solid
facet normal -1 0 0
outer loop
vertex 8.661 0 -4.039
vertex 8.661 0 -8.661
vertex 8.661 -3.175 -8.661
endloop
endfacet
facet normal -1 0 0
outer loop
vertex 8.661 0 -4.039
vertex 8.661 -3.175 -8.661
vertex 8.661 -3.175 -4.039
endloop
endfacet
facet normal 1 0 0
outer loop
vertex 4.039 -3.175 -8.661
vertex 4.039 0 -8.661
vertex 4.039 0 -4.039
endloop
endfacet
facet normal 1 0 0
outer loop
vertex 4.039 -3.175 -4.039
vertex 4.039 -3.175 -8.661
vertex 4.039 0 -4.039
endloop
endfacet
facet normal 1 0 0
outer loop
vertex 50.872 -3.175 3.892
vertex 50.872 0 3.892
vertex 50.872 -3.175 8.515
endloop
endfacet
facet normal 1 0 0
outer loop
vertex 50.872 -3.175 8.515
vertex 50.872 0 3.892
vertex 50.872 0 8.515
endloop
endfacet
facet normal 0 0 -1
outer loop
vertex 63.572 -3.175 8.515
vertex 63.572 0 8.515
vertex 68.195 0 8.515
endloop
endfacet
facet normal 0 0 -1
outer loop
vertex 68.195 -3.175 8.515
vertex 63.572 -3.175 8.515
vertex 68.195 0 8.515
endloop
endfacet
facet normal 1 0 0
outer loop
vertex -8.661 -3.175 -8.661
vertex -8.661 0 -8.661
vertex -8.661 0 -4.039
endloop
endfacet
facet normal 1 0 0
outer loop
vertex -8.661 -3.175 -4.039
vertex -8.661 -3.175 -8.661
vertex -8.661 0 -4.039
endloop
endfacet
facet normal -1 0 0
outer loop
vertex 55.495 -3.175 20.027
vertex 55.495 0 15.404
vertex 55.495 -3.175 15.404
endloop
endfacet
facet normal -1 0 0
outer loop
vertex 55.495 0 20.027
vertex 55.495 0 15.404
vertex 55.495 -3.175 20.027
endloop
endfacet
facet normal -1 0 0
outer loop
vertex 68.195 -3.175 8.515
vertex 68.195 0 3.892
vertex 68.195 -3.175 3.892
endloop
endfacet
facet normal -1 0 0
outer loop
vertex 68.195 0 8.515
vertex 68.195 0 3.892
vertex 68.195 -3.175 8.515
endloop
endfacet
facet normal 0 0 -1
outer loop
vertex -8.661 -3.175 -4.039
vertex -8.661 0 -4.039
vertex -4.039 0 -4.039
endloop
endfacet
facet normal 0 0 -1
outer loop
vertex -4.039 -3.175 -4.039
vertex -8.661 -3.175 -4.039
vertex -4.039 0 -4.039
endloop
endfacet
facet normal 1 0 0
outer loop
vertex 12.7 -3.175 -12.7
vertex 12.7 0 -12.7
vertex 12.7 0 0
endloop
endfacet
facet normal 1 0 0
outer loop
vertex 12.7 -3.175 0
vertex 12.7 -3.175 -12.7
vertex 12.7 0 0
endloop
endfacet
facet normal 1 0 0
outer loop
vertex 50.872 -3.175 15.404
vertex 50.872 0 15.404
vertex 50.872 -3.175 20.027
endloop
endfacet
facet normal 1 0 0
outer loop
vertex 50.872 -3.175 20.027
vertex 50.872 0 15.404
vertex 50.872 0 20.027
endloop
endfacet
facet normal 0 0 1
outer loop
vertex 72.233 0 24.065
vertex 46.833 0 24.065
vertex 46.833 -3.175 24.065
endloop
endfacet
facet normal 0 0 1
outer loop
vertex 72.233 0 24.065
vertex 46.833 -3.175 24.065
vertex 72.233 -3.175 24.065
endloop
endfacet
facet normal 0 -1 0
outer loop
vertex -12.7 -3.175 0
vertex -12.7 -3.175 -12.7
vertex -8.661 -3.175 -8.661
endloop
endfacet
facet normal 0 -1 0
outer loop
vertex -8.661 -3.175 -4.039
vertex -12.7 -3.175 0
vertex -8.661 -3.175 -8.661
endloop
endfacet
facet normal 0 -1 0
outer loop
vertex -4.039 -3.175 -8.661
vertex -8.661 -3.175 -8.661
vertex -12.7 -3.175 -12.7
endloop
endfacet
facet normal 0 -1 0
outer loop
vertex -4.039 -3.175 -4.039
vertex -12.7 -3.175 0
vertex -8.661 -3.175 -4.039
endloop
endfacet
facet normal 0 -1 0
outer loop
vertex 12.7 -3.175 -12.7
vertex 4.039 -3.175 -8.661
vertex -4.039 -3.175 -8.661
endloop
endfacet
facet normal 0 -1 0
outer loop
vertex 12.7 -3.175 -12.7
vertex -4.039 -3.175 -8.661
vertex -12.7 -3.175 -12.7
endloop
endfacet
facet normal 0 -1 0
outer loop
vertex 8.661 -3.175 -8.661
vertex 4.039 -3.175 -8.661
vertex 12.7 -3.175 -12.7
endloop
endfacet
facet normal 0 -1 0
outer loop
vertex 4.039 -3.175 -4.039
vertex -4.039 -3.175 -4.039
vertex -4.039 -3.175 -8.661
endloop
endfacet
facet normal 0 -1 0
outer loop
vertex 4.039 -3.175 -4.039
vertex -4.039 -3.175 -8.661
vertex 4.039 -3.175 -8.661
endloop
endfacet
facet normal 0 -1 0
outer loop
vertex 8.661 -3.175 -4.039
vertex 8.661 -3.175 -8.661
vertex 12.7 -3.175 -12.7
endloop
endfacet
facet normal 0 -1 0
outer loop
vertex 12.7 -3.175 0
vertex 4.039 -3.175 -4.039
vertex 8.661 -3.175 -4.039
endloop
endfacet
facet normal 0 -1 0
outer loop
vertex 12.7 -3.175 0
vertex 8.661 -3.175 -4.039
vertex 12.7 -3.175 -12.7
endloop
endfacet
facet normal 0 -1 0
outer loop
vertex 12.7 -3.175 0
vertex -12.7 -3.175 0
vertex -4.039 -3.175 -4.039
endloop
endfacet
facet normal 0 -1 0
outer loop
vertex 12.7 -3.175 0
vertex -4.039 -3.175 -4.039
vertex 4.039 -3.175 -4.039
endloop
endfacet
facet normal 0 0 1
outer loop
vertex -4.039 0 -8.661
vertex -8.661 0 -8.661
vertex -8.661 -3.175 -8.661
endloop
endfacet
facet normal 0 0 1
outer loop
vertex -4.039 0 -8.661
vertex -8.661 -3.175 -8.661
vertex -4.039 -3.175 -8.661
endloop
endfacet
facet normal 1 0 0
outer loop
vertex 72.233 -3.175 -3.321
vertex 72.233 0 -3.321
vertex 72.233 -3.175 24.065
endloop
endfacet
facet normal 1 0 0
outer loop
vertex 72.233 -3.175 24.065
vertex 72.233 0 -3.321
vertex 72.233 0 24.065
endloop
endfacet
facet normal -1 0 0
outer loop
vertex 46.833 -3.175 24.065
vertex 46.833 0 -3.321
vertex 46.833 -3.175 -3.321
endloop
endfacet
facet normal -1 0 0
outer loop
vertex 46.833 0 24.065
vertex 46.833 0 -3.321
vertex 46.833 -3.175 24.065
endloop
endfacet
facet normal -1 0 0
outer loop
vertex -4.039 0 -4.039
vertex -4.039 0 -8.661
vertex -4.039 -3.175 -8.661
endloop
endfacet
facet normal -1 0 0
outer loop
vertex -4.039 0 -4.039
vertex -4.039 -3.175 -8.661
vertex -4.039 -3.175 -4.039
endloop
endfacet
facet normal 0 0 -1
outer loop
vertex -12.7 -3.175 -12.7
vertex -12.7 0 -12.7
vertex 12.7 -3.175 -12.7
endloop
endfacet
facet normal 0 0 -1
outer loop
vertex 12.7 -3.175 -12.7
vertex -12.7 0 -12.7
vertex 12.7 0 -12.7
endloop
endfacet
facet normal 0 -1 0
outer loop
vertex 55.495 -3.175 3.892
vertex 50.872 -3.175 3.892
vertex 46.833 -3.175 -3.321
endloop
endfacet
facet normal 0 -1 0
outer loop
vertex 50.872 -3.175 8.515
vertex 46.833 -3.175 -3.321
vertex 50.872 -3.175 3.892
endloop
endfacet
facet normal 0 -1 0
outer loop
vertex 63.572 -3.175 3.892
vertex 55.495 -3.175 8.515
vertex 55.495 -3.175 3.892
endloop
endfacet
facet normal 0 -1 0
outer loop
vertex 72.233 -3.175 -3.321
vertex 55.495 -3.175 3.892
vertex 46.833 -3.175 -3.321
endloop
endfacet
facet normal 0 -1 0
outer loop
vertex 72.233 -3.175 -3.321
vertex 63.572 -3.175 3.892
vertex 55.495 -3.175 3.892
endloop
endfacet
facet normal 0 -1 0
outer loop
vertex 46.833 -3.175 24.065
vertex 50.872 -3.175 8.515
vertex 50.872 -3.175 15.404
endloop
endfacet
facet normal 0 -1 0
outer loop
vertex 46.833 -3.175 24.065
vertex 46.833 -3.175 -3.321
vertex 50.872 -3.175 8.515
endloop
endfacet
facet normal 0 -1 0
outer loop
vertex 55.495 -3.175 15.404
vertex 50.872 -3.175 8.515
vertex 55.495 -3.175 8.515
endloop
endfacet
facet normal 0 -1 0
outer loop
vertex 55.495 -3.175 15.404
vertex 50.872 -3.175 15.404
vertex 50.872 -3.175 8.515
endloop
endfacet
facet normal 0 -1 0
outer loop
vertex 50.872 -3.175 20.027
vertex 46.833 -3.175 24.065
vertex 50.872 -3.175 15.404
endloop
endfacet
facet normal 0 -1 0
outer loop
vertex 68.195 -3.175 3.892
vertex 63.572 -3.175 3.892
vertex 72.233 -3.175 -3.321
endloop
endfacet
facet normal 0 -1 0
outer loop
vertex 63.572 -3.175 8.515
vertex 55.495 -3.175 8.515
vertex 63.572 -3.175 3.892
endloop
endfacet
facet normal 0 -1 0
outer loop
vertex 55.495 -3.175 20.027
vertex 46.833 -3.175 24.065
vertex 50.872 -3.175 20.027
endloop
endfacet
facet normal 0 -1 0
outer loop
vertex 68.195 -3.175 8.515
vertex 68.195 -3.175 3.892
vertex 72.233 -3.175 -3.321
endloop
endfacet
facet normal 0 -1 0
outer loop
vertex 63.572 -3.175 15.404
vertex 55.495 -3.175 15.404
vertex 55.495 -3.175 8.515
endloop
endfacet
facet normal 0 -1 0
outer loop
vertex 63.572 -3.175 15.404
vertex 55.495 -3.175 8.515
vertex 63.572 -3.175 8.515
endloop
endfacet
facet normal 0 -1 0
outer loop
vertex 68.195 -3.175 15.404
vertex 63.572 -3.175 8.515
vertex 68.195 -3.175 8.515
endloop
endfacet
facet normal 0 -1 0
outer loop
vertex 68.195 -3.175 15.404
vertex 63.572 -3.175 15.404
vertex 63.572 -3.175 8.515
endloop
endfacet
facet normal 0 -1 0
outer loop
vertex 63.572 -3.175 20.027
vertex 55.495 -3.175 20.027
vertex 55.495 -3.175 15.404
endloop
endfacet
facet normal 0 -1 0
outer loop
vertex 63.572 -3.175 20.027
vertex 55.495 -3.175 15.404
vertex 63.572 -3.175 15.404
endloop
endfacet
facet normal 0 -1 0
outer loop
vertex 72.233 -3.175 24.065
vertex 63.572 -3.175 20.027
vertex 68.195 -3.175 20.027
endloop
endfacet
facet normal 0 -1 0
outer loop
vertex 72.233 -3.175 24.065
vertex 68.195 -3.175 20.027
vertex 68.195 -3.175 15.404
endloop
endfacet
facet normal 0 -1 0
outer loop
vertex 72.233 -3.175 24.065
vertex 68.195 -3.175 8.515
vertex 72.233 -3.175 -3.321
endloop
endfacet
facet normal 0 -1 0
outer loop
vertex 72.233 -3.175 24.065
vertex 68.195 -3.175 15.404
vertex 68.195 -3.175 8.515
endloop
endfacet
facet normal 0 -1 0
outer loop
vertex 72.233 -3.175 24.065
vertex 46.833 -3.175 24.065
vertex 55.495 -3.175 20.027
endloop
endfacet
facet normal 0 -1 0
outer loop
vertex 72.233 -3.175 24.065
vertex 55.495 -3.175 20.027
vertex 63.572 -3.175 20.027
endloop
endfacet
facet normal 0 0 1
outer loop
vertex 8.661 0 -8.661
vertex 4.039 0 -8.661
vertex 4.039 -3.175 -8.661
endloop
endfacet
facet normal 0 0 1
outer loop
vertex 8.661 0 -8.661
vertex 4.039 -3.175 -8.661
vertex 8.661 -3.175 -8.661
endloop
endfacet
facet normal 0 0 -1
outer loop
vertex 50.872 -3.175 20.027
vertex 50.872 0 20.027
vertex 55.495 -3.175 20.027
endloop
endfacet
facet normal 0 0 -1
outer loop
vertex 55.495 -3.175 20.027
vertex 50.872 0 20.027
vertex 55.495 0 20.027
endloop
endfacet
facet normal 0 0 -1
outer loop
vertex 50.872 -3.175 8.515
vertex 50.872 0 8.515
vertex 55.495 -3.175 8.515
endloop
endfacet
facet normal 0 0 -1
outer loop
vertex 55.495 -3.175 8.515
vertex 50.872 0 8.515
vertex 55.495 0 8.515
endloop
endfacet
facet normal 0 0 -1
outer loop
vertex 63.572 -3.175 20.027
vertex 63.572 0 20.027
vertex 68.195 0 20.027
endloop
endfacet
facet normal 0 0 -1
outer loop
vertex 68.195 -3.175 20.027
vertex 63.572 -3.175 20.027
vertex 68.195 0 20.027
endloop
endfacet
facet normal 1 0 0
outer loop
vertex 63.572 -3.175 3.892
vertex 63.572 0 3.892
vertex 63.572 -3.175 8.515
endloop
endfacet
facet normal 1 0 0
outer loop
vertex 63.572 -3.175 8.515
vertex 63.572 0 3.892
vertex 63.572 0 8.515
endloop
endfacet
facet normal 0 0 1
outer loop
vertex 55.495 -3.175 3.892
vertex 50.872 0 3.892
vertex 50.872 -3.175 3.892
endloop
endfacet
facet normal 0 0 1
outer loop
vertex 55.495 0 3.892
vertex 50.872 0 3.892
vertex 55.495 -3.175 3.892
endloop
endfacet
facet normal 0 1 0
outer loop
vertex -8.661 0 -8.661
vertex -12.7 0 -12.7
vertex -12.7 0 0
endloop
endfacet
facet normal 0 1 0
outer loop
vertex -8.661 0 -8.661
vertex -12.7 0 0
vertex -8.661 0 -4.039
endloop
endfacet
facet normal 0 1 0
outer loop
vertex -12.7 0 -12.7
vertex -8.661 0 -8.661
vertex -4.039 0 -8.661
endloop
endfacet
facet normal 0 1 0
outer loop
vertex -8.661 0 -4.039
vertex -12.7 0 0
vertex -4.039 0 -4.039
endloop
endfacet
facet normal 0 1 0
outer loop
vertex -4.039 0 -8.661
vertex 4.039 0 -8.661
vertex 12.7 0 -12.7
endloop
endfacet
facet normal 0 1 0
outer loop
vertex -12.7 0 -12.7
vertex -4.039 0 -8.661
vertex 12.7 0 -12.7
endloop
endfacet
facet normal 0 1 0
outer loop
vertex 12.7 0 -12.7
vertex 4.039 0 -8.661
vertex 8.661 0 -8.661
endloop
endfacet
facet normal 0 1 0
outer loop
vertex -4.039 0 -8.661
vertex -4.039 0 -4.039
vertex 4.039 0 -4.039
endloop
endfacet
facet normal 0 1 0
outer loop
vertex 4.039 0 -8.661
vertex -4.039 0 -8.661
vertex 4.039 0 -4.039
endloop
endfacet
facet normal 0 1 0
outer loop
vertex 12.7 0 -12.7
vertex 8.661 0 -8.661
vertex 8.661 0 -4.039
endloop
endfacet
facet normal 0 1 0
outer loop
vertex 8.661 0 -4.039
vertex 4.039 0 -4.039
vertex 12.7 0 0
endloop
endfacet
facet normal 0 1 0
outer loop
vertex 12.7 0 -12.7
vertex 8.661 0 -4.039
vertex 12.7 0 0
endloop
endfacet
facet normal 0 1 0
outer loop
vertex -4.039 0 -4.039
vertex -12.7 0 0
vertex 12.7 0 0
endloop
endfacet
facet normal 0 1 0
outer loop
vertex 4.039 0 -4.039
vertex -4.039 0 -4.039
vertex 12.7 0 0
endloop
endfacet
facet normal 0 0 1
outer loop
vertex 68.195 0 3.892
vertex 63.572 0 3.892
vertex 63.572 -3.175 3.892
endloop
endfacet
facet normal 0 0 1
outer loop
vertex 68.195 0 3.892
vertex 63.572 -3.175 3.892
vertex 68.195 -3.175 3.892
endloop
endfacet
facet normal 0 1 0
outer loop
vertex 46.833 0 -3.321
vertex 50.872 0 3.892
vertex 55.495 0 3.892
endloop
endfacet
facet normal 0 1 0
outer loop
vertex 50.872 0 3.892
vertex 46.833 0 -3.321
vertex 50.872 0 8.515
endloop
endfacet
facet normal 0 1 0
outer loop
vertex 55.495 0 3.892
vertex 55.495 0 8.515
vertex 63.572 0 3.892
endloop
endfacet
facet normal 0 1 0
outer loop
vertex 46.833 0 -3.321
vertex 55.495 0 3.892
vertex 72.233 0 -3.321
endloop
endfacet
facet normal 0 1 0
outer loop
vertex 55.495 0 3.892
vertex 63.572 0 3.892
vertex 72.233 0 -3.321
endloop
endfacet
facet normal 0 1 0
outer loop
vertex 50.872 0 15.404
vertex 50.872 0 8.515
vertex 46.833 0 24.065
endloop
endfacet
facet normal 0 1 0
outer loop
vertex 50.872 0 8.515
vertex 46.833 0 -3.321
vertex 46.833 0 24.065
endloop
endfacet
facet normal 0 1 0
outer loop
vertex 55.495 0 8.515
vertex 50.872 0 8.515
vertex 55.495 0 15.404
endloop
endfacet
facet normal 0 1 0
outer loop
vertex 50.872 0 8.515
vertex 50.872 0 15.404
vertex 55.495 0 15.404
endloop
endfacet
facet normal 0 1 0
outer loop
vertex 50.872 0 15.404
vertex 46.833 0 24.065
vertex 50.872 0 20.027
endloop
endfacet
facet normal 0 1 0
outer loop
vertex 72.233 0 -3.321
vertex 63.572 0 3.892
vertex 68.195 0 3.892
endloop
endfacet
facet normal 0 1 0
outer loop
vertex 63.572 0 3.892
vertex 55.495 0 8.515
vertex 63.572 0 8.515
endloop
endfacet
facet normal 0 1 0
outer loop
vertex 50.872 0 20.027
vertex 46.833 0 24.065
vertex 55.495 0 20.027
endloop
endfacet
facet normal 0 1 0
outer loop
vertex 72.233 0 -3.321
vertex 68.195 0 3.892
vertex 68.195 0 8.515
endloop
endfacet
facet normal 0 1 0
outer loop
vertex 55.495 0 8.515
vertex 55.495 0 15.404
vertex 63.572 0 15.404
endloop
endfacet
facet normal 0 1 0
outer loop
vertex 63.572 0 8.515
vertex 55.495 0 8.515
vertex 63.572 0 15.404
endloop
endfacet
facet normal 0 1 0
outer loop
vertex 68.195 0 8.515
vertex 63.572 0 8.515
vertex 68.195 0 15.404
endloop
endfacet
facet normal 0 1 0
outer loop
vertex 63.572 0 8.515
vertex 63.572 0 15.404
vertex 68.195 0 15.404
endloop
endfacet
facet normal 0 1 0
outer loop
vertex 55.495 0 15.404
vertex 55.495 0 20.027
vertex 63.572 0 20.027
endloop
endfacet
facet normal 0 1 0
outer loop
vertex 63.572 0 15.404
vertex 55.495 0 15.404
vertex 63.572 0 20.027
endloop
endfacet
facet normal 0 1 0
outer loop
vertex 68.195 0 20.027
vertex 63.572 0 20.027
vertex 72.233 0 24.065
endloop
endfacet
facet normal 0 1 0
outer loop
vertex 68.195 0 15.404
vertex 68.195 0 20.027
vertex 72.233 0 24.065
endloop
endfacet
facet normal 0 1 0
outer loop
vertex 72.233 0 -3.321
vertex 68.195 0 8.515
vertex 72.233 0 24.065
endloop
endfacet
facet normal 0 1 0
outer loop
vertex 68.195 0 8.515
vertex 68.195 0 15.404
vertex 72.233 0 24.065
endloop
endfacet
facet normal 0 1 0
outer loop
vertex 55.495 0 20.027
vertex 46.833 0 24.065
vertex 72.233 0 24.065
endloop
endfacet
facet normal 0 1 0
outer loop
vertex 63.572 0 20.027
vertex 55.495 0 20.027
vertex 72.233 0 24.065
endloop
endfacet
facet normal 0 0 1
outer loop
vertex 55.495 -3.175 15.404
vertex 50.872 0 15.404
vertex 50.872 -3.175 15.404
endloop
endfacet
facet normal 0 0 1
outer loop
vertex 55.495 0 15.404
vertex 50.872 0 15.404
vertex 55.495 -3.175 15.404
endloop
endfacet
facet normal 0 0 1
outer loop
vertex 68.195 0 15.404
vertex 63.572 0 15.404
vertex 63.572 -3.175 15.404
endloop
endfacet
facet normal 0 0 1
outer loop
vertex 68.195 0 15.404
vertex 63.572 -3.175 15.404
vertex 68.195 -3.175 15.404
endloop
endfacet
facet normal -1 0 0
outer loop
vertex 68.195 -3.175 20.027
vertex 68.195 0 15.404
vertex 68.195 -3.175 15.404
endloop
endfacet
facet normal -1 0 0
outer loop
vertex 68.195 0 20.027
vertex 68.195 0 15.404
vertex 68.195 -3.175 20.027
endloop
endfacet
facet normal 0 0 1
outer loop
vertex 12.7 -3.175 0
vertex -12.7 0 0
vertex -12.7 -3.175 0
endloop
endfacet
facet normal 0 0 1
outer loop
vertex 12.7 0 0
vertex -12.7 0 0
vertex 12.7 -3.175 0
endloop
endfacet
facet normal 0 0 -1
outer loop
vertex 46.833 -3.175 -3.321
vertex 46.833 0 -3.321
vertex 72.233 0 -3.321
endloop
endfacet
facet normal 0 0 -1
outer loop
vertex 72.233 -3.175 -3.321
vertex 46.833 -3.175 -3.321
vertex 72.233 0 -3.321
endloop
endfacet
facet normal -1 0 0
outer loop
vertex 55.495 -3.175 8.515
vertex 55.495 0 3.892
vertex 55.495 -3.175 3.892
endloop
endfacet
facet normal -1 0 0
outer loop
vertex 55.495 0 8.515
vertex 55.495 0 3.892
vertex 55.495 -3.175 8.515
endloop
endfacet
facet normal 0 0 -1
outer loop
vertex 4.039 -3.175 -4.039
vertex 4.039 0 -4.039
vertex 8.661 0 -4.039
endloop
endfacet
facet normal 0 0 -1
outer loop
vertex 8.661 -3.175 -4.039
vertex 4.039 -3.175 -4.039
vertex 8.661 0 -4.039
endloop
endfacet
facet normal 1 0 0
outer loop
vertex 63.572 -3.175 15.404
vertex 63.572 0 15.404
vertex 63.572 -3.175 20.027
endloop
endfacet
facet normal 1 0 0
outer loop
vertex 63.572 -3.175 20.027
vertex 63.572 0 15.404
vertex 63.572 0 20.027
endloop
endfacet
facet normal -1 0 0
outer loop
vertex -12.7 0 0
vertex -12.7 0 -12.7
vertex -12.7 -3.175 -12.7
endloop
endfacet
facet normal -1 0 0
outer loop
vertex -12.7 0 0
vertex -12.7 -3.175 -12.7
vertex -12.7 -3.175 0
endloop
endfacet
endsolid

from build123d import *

# Parameters (mm, degrees)
F0_W     = 25.4
F0_H     = 12.7
F0_W_2   = 4.6228
F0_H_2   = 4.6228
F0_H_3   = 27.386816
F1_DEPTH = 3.175


with BuildPart() as f1:
    # F0 (on Front) → F1 (new body)
    with BuildSketch(Plane.XZ):
        with Locations((0, -6.35)):
            Rectangle(F0_W, F0_H)
        with Locations((-6.35, -6.35)):
            Rectangle(F0_W_2, F0_H_2, mode=Mode.SUBTRACT)
        with Locations((6.35, -6.35)):
            Rectangle(F0_W_2, F0_H_2, mode=Mode.SUBTRACT)
        with Locations((59.533277, 10.371986)):
            Rectangle(F0_W, F0_H_3)
        with Locations((53.183277, 6.203578)):
            Rectangle(F0_W_2, F0_H_2, mode=Mode.SUBTRACT)
        with Locations((65.883277, 6.203578)):
            Rectangle(F0_W_2, F0_H_2, mode=Mode.SUBTRACT)
        with Locations((53.183277, 17.715394)):
            Rectangle(F0_W_2, F0_H_2, mode=Mode.SUBTRACT)
        with Locations((65.883277, 17.715394)):
            Rectangle(F0_W_2, F0_H_2, mode=Mode.SUBTRACT)
    extrude(amount=F1_DEPTH)


solid = f1.part
